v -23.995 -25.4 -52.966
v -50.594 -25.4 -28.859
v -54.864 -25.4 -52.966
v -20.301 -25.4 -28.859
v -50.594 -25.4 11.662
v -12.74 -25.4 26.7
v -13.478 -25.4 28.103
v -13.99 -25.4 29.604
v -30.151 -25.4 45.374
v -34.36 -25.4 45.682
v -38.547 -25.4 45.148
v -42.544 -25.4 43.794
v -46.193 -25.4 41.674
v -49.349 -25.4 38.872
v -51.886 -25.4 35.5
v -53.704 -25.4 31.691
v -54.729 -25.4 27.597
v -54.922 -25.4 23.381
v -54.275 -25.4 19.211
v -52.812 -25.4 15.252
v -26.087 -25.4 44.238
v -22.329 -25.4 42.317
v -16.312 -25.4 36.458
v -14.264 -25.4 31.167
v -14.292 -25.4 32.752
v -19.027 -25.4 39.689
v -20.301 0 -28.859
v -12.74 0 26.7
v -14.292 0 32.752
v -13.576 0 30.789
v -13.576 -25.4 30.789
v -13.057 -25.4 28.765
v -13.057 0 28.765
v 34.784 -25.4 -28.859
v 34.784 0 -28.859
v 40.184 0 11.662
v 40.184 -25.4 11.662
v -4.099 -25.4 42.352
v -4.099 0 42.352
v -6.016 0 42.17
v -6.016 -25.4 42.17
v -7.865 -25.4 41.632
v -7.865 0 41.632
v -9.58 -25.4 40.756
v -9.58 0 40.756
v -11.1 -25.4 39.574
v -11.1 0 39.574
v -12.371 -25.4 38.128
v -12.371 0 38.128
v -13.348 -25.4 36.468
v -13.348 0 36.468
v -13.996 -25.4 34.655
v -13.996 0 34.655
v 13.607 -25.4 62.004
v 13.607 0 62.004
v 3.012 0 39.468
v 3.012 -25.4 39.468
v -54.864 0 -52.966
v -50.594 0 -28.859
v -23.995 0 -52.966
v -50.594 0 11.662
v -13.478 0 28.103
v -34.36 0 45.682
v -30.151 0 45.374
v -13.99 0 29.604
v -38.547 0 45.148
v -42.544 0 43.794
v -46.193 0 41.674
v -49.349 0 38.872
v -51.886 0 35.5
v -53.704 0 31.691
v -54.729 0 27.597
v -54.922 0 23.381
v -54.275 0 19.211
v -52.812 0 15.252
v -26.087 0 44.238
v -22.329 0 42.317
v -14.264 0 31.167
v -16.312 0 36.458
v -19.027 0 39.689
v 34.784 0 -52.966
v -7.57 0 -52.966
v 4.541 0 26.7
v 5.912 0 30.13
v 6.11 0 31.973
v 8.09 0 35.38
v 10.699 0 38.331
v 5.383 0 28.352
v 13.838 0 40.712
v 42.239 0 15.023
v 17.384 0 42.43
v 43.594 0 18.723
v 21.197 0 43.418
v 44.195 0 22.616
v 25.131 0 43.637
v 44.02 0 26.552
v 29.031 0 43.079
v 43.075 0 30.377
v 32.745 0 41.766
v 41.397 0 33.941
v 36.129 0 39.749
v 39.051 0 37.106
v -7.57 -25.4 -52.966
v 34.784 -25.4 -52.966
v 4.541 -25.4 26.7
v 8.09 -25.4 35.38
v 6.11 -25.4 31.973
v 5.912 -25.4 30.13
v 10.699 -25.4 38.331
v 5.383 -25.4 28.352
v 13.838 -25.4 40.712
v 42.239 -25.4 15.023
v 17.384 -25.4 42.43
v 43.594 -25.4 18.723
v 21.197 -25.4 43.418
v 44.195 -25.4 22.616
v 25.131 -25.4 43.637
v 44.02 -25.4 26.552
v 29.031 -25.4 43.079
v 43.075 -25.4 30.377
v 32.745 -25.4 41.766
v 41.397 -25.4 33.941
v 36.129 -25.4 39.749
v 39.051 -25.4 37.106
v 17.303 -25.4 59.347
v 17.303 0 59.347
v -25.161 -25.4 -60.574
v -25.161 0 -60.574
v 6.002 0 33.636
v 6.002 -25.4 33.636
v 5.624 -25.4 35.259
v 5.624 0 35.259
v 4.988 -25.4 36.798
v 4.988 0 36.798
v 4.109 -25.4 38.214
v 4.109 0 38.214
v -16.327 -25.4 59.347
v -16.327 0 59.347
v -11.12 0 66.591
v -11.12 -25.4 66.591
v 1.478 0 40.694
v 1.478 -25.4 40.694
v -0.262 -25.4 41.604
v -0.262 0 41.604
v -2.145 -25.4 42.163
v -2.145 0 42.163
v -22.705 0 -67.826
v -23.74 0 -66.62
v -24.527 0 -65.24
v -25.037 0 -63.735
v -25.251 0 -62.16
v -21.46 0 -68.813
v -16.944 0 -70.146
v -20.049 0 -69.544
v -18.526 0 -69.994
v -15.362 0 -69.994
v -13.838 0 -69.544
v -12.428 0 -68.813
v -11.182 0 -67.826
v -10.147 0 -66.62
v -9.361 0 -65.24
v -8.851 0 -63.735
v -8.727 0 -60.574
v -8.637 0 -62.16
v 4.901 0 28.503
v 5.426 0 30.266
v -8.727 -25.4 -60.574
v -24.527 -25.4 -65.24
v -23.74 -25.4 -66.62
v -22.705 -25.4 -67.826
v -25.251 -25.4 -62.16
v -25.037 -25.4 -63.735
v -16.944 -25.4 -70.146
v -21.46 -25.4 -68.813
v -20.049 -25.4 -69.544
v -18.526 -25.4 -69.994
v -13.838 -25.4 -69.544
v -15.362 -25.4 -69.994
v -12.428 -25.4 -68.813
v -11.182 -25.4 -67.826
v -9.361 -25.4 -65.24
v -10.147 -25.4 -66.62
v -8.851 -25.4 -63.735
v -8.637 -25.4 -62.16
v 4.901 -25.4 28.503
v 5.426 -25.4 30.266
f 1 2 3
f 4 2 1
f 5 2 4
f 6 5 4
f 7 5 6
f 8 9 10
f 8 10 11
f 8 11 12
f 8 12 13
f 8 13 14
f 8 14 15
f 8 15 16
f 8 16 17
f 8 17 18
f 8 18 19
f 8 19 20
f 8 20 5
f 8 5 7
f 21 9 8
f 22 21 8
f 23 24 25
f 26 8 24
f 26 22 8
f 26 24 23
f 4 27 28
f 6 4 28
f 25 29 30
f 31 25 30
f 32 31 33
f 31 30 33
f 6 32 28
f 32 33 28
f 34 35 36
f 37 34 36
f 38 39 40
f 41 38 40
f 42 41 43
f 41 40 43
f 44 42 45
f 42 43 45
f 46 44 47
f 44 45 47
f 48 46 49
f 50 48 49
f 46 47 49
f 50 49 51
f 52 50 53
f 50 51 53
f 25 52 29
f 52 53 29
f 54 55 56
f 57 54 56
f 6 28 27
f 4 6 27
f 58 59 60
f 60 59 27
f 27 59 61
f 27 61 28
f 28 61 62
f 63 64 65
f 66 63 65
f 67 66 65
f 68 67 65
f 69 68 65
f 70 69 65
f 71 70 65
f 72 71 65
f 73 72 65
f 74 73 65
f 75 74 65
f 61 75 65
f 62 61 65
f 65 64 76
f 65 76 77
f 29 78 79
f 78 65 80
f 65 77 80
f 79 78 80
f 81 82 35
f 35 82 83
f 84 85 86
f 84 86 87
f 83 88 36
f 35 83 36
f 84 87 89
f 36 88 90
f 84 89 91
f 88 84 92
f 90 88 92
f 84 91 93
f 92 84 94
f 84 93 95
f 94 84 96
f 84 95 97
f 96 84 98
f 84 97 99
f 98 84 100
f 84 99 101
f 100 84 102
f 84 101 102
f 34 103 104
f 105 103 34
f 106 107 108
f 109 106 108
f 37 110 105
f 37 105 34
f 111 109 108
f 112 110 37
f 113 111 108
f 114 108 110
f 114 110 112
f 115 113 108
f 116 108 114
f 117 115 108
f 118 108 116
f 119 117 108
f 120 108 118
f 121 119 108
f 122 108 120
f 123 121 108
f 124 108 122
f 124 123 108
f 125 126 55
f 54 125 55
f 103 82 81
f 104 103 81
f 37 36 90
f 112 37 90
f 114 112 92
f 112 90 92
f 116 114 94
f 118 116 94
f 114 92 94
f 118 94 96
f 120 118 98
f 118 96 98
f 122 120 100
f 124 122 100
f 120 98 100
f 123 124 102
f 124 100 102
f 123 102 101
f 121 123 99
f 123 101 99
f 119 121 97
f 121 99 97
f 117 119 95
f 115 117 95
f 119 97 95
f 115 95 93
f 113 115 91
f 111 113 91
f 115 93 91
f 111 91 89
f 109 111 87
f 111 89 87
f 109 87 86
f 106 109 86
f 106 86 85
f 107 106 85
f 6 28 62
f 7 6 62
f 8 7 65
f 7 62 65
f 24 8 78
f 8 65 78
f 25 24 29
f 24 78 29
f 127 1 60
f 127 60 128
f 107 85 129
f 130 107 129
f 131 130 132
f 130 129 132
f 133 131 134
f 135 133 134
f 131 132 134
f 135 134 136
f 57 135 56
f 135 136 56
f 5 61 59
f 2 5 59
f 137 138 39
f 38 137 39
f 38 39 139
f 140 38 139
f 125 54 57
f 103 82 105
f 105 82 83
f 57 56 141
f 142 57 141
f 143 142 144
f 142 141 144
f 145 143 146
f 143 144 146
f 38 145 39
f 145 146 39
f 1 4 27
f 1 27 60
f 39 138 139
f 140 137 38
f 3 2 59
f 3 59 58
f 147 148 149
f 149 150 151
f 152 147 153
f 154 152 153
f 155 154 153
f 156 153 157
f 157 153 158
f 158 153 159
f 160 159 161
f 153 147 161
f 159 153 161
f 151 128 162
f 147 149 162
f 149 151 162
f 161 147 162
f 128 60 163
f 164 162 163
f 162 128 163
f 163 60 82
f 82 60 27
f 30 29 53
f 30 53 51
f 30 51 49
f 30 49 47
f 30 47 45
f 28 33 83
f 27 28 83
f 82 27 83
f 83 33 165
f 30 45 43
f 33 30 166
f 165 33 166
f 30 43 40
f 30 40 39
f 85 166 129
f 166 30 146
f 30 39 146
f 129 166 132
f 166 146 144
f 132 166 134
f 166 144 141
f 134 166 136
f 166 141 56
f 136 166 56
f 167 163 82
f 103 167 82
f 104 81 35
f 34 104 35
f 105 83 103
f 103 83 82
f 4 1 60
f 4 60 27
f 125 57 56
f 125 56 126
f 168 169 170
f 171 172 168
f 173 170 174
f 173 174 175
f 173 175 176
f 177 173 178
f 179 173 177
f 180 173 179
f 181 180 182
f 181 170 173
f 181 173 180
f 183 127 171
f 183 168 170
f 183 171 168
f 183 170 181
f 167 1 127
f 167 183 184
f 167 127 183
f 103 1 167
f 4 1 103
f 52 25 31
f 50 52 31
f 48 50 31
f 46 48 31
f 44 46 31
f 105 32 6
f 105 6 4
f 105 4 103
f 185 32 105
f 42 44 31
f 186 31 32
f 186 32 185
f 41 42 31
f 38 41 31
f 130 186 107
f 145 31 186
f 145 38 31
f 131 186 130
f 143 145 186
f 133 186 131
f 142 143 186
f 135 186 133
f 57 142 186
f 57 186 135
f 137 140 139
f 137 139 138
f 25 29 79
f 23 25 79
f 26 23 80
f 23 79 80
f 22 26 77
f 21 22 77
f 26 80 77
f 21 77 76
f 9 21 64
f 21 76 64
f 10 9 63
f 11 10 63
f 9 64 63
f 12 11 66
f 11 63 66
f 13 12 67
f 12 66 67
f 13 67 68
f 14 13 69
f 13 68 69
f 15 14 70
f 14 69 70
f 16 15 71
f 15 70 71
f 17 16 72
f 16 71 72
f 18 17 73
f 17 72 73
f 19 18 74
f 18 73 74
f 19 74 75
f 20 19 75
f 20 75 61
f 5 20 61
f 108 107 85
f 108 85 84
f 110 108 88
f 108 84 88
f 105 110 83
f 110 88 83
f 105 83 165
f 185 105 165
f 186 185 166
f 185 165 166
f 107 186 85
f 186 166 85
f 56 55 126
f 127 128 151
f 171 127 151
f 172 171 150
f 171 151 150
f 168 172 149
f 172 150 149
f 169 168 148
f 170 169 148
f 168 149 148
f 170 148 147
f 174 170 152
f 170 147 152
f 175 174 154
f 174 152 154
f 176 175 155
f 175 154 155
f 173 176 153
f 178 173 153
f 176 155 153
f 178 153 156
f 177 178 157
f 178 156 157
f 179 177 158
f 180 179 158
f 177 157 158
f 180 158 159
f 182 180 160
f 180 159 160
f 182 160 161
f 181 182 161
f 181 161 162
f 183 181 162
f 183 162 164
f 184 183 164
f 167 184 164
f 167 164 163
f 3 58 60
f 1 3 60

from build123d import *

# Parameters (mm, degrees)
F1_DEPTH = 25.4
F2_DEPTH = 25.4


with BuildPart() as f1:
    # F0 (on Front) → F1 (new body)
    with BuildSketch(Plane.XZ):
        with BuildLine():
            ThreePointArc((-14.292186, 32.752353), (-44.421582, 42.825525), (-50.593808, 11.662199))
            Line((-50.593808, 11.662199), (-50.593808, -28.858742))
            Line((-50.593808, -28.858742), (-54.863632, -52.965853))
            Line((-54.863632, -52.965853), (-23.995228, -52.965853))
            Line((-23.995228, -52.965853), (-20.300755, -28.858742))
            Line((-20.300755, -28.858742), (-12.740128, 26.699767))
            ThreePointArc((-12.740128, 26.699767), (-13.990496, 29.604426), (-14.292186, 32.752353))
        make_face()
        with BuildLine():
            ThreePointArc((40.184271, 11.662199), (34.487037, 40.841232), (6.110329, 31.973488))
            ThreePointArc((6.110329, 31.973488), (5.687724, 29.228955), (4.54131, 26.699767))
            Line((4.54131, 26.699767), (-7.569964, -52.965853))
            Line((-7.569964, -52.965853), (34.783822, -52.965853))
            Line((34.783822, -52.965853), (34.783822, -28.858742))
            Line((34.783822, -28.858742), (40.184271, 11.662199))
        make_face()
        Polygon((-16.326868, 59.347398), (-4.099409, 42.351896), (-11.119992, 66.590741), align=None)
        Polygon((13.606929, 62.004106), (3.012426, 39.468034), (17.302704, 59.347398), align=None)
    extrude(amount=F1_DEPTH)


with BuildPart() as f2:
    # F0 (on Front) → F2 (new body)
    with BuildSketch(Plane.XZ):
        with BuildLine():
            ThreePointArc((-4.099409, 42.351896), (-11.100193, 39.574208), (-14.292186, 32.752353))
            ThreePointArc((-14.292186, 32.752353), (-13.291541, 29.783658), (-12.740128, 26.699767))
            Line((-12.740128, 26.699767), (-20.300755, -28.858742))
            Line((-20.300755, -28.858742), (-23.995228, -52.965853))
            Line((-23.995228, -52.965853), (-25.16116, -60.573778))
            ThreePointArc((-25.16116, -60.573778), (-16.943865, -70.14633), (-8.726569, -60.573778))
            Line((-8.726569, -60.573778), (-7.569964, -52.965853))
            Line((-7.569964, -52.965853), (4.54131, 26.699767))
            ThreePointArc((4.54131, 26.699767), (5.143182, 29.390965), (6.110329, 31.973488))
            ThreePointArc((6.110329, 31.973488), (5.337289, 36.041488), (3.012426, 39.468034))
            ThreePointArc((3.012426, 39.468034), (-0.26226, 41.603505), (-4.099409, 42.351896))
        make_face()
    extrude(amount=F2_DEPTH)


solid = Compound([f1.part, f2.part])
